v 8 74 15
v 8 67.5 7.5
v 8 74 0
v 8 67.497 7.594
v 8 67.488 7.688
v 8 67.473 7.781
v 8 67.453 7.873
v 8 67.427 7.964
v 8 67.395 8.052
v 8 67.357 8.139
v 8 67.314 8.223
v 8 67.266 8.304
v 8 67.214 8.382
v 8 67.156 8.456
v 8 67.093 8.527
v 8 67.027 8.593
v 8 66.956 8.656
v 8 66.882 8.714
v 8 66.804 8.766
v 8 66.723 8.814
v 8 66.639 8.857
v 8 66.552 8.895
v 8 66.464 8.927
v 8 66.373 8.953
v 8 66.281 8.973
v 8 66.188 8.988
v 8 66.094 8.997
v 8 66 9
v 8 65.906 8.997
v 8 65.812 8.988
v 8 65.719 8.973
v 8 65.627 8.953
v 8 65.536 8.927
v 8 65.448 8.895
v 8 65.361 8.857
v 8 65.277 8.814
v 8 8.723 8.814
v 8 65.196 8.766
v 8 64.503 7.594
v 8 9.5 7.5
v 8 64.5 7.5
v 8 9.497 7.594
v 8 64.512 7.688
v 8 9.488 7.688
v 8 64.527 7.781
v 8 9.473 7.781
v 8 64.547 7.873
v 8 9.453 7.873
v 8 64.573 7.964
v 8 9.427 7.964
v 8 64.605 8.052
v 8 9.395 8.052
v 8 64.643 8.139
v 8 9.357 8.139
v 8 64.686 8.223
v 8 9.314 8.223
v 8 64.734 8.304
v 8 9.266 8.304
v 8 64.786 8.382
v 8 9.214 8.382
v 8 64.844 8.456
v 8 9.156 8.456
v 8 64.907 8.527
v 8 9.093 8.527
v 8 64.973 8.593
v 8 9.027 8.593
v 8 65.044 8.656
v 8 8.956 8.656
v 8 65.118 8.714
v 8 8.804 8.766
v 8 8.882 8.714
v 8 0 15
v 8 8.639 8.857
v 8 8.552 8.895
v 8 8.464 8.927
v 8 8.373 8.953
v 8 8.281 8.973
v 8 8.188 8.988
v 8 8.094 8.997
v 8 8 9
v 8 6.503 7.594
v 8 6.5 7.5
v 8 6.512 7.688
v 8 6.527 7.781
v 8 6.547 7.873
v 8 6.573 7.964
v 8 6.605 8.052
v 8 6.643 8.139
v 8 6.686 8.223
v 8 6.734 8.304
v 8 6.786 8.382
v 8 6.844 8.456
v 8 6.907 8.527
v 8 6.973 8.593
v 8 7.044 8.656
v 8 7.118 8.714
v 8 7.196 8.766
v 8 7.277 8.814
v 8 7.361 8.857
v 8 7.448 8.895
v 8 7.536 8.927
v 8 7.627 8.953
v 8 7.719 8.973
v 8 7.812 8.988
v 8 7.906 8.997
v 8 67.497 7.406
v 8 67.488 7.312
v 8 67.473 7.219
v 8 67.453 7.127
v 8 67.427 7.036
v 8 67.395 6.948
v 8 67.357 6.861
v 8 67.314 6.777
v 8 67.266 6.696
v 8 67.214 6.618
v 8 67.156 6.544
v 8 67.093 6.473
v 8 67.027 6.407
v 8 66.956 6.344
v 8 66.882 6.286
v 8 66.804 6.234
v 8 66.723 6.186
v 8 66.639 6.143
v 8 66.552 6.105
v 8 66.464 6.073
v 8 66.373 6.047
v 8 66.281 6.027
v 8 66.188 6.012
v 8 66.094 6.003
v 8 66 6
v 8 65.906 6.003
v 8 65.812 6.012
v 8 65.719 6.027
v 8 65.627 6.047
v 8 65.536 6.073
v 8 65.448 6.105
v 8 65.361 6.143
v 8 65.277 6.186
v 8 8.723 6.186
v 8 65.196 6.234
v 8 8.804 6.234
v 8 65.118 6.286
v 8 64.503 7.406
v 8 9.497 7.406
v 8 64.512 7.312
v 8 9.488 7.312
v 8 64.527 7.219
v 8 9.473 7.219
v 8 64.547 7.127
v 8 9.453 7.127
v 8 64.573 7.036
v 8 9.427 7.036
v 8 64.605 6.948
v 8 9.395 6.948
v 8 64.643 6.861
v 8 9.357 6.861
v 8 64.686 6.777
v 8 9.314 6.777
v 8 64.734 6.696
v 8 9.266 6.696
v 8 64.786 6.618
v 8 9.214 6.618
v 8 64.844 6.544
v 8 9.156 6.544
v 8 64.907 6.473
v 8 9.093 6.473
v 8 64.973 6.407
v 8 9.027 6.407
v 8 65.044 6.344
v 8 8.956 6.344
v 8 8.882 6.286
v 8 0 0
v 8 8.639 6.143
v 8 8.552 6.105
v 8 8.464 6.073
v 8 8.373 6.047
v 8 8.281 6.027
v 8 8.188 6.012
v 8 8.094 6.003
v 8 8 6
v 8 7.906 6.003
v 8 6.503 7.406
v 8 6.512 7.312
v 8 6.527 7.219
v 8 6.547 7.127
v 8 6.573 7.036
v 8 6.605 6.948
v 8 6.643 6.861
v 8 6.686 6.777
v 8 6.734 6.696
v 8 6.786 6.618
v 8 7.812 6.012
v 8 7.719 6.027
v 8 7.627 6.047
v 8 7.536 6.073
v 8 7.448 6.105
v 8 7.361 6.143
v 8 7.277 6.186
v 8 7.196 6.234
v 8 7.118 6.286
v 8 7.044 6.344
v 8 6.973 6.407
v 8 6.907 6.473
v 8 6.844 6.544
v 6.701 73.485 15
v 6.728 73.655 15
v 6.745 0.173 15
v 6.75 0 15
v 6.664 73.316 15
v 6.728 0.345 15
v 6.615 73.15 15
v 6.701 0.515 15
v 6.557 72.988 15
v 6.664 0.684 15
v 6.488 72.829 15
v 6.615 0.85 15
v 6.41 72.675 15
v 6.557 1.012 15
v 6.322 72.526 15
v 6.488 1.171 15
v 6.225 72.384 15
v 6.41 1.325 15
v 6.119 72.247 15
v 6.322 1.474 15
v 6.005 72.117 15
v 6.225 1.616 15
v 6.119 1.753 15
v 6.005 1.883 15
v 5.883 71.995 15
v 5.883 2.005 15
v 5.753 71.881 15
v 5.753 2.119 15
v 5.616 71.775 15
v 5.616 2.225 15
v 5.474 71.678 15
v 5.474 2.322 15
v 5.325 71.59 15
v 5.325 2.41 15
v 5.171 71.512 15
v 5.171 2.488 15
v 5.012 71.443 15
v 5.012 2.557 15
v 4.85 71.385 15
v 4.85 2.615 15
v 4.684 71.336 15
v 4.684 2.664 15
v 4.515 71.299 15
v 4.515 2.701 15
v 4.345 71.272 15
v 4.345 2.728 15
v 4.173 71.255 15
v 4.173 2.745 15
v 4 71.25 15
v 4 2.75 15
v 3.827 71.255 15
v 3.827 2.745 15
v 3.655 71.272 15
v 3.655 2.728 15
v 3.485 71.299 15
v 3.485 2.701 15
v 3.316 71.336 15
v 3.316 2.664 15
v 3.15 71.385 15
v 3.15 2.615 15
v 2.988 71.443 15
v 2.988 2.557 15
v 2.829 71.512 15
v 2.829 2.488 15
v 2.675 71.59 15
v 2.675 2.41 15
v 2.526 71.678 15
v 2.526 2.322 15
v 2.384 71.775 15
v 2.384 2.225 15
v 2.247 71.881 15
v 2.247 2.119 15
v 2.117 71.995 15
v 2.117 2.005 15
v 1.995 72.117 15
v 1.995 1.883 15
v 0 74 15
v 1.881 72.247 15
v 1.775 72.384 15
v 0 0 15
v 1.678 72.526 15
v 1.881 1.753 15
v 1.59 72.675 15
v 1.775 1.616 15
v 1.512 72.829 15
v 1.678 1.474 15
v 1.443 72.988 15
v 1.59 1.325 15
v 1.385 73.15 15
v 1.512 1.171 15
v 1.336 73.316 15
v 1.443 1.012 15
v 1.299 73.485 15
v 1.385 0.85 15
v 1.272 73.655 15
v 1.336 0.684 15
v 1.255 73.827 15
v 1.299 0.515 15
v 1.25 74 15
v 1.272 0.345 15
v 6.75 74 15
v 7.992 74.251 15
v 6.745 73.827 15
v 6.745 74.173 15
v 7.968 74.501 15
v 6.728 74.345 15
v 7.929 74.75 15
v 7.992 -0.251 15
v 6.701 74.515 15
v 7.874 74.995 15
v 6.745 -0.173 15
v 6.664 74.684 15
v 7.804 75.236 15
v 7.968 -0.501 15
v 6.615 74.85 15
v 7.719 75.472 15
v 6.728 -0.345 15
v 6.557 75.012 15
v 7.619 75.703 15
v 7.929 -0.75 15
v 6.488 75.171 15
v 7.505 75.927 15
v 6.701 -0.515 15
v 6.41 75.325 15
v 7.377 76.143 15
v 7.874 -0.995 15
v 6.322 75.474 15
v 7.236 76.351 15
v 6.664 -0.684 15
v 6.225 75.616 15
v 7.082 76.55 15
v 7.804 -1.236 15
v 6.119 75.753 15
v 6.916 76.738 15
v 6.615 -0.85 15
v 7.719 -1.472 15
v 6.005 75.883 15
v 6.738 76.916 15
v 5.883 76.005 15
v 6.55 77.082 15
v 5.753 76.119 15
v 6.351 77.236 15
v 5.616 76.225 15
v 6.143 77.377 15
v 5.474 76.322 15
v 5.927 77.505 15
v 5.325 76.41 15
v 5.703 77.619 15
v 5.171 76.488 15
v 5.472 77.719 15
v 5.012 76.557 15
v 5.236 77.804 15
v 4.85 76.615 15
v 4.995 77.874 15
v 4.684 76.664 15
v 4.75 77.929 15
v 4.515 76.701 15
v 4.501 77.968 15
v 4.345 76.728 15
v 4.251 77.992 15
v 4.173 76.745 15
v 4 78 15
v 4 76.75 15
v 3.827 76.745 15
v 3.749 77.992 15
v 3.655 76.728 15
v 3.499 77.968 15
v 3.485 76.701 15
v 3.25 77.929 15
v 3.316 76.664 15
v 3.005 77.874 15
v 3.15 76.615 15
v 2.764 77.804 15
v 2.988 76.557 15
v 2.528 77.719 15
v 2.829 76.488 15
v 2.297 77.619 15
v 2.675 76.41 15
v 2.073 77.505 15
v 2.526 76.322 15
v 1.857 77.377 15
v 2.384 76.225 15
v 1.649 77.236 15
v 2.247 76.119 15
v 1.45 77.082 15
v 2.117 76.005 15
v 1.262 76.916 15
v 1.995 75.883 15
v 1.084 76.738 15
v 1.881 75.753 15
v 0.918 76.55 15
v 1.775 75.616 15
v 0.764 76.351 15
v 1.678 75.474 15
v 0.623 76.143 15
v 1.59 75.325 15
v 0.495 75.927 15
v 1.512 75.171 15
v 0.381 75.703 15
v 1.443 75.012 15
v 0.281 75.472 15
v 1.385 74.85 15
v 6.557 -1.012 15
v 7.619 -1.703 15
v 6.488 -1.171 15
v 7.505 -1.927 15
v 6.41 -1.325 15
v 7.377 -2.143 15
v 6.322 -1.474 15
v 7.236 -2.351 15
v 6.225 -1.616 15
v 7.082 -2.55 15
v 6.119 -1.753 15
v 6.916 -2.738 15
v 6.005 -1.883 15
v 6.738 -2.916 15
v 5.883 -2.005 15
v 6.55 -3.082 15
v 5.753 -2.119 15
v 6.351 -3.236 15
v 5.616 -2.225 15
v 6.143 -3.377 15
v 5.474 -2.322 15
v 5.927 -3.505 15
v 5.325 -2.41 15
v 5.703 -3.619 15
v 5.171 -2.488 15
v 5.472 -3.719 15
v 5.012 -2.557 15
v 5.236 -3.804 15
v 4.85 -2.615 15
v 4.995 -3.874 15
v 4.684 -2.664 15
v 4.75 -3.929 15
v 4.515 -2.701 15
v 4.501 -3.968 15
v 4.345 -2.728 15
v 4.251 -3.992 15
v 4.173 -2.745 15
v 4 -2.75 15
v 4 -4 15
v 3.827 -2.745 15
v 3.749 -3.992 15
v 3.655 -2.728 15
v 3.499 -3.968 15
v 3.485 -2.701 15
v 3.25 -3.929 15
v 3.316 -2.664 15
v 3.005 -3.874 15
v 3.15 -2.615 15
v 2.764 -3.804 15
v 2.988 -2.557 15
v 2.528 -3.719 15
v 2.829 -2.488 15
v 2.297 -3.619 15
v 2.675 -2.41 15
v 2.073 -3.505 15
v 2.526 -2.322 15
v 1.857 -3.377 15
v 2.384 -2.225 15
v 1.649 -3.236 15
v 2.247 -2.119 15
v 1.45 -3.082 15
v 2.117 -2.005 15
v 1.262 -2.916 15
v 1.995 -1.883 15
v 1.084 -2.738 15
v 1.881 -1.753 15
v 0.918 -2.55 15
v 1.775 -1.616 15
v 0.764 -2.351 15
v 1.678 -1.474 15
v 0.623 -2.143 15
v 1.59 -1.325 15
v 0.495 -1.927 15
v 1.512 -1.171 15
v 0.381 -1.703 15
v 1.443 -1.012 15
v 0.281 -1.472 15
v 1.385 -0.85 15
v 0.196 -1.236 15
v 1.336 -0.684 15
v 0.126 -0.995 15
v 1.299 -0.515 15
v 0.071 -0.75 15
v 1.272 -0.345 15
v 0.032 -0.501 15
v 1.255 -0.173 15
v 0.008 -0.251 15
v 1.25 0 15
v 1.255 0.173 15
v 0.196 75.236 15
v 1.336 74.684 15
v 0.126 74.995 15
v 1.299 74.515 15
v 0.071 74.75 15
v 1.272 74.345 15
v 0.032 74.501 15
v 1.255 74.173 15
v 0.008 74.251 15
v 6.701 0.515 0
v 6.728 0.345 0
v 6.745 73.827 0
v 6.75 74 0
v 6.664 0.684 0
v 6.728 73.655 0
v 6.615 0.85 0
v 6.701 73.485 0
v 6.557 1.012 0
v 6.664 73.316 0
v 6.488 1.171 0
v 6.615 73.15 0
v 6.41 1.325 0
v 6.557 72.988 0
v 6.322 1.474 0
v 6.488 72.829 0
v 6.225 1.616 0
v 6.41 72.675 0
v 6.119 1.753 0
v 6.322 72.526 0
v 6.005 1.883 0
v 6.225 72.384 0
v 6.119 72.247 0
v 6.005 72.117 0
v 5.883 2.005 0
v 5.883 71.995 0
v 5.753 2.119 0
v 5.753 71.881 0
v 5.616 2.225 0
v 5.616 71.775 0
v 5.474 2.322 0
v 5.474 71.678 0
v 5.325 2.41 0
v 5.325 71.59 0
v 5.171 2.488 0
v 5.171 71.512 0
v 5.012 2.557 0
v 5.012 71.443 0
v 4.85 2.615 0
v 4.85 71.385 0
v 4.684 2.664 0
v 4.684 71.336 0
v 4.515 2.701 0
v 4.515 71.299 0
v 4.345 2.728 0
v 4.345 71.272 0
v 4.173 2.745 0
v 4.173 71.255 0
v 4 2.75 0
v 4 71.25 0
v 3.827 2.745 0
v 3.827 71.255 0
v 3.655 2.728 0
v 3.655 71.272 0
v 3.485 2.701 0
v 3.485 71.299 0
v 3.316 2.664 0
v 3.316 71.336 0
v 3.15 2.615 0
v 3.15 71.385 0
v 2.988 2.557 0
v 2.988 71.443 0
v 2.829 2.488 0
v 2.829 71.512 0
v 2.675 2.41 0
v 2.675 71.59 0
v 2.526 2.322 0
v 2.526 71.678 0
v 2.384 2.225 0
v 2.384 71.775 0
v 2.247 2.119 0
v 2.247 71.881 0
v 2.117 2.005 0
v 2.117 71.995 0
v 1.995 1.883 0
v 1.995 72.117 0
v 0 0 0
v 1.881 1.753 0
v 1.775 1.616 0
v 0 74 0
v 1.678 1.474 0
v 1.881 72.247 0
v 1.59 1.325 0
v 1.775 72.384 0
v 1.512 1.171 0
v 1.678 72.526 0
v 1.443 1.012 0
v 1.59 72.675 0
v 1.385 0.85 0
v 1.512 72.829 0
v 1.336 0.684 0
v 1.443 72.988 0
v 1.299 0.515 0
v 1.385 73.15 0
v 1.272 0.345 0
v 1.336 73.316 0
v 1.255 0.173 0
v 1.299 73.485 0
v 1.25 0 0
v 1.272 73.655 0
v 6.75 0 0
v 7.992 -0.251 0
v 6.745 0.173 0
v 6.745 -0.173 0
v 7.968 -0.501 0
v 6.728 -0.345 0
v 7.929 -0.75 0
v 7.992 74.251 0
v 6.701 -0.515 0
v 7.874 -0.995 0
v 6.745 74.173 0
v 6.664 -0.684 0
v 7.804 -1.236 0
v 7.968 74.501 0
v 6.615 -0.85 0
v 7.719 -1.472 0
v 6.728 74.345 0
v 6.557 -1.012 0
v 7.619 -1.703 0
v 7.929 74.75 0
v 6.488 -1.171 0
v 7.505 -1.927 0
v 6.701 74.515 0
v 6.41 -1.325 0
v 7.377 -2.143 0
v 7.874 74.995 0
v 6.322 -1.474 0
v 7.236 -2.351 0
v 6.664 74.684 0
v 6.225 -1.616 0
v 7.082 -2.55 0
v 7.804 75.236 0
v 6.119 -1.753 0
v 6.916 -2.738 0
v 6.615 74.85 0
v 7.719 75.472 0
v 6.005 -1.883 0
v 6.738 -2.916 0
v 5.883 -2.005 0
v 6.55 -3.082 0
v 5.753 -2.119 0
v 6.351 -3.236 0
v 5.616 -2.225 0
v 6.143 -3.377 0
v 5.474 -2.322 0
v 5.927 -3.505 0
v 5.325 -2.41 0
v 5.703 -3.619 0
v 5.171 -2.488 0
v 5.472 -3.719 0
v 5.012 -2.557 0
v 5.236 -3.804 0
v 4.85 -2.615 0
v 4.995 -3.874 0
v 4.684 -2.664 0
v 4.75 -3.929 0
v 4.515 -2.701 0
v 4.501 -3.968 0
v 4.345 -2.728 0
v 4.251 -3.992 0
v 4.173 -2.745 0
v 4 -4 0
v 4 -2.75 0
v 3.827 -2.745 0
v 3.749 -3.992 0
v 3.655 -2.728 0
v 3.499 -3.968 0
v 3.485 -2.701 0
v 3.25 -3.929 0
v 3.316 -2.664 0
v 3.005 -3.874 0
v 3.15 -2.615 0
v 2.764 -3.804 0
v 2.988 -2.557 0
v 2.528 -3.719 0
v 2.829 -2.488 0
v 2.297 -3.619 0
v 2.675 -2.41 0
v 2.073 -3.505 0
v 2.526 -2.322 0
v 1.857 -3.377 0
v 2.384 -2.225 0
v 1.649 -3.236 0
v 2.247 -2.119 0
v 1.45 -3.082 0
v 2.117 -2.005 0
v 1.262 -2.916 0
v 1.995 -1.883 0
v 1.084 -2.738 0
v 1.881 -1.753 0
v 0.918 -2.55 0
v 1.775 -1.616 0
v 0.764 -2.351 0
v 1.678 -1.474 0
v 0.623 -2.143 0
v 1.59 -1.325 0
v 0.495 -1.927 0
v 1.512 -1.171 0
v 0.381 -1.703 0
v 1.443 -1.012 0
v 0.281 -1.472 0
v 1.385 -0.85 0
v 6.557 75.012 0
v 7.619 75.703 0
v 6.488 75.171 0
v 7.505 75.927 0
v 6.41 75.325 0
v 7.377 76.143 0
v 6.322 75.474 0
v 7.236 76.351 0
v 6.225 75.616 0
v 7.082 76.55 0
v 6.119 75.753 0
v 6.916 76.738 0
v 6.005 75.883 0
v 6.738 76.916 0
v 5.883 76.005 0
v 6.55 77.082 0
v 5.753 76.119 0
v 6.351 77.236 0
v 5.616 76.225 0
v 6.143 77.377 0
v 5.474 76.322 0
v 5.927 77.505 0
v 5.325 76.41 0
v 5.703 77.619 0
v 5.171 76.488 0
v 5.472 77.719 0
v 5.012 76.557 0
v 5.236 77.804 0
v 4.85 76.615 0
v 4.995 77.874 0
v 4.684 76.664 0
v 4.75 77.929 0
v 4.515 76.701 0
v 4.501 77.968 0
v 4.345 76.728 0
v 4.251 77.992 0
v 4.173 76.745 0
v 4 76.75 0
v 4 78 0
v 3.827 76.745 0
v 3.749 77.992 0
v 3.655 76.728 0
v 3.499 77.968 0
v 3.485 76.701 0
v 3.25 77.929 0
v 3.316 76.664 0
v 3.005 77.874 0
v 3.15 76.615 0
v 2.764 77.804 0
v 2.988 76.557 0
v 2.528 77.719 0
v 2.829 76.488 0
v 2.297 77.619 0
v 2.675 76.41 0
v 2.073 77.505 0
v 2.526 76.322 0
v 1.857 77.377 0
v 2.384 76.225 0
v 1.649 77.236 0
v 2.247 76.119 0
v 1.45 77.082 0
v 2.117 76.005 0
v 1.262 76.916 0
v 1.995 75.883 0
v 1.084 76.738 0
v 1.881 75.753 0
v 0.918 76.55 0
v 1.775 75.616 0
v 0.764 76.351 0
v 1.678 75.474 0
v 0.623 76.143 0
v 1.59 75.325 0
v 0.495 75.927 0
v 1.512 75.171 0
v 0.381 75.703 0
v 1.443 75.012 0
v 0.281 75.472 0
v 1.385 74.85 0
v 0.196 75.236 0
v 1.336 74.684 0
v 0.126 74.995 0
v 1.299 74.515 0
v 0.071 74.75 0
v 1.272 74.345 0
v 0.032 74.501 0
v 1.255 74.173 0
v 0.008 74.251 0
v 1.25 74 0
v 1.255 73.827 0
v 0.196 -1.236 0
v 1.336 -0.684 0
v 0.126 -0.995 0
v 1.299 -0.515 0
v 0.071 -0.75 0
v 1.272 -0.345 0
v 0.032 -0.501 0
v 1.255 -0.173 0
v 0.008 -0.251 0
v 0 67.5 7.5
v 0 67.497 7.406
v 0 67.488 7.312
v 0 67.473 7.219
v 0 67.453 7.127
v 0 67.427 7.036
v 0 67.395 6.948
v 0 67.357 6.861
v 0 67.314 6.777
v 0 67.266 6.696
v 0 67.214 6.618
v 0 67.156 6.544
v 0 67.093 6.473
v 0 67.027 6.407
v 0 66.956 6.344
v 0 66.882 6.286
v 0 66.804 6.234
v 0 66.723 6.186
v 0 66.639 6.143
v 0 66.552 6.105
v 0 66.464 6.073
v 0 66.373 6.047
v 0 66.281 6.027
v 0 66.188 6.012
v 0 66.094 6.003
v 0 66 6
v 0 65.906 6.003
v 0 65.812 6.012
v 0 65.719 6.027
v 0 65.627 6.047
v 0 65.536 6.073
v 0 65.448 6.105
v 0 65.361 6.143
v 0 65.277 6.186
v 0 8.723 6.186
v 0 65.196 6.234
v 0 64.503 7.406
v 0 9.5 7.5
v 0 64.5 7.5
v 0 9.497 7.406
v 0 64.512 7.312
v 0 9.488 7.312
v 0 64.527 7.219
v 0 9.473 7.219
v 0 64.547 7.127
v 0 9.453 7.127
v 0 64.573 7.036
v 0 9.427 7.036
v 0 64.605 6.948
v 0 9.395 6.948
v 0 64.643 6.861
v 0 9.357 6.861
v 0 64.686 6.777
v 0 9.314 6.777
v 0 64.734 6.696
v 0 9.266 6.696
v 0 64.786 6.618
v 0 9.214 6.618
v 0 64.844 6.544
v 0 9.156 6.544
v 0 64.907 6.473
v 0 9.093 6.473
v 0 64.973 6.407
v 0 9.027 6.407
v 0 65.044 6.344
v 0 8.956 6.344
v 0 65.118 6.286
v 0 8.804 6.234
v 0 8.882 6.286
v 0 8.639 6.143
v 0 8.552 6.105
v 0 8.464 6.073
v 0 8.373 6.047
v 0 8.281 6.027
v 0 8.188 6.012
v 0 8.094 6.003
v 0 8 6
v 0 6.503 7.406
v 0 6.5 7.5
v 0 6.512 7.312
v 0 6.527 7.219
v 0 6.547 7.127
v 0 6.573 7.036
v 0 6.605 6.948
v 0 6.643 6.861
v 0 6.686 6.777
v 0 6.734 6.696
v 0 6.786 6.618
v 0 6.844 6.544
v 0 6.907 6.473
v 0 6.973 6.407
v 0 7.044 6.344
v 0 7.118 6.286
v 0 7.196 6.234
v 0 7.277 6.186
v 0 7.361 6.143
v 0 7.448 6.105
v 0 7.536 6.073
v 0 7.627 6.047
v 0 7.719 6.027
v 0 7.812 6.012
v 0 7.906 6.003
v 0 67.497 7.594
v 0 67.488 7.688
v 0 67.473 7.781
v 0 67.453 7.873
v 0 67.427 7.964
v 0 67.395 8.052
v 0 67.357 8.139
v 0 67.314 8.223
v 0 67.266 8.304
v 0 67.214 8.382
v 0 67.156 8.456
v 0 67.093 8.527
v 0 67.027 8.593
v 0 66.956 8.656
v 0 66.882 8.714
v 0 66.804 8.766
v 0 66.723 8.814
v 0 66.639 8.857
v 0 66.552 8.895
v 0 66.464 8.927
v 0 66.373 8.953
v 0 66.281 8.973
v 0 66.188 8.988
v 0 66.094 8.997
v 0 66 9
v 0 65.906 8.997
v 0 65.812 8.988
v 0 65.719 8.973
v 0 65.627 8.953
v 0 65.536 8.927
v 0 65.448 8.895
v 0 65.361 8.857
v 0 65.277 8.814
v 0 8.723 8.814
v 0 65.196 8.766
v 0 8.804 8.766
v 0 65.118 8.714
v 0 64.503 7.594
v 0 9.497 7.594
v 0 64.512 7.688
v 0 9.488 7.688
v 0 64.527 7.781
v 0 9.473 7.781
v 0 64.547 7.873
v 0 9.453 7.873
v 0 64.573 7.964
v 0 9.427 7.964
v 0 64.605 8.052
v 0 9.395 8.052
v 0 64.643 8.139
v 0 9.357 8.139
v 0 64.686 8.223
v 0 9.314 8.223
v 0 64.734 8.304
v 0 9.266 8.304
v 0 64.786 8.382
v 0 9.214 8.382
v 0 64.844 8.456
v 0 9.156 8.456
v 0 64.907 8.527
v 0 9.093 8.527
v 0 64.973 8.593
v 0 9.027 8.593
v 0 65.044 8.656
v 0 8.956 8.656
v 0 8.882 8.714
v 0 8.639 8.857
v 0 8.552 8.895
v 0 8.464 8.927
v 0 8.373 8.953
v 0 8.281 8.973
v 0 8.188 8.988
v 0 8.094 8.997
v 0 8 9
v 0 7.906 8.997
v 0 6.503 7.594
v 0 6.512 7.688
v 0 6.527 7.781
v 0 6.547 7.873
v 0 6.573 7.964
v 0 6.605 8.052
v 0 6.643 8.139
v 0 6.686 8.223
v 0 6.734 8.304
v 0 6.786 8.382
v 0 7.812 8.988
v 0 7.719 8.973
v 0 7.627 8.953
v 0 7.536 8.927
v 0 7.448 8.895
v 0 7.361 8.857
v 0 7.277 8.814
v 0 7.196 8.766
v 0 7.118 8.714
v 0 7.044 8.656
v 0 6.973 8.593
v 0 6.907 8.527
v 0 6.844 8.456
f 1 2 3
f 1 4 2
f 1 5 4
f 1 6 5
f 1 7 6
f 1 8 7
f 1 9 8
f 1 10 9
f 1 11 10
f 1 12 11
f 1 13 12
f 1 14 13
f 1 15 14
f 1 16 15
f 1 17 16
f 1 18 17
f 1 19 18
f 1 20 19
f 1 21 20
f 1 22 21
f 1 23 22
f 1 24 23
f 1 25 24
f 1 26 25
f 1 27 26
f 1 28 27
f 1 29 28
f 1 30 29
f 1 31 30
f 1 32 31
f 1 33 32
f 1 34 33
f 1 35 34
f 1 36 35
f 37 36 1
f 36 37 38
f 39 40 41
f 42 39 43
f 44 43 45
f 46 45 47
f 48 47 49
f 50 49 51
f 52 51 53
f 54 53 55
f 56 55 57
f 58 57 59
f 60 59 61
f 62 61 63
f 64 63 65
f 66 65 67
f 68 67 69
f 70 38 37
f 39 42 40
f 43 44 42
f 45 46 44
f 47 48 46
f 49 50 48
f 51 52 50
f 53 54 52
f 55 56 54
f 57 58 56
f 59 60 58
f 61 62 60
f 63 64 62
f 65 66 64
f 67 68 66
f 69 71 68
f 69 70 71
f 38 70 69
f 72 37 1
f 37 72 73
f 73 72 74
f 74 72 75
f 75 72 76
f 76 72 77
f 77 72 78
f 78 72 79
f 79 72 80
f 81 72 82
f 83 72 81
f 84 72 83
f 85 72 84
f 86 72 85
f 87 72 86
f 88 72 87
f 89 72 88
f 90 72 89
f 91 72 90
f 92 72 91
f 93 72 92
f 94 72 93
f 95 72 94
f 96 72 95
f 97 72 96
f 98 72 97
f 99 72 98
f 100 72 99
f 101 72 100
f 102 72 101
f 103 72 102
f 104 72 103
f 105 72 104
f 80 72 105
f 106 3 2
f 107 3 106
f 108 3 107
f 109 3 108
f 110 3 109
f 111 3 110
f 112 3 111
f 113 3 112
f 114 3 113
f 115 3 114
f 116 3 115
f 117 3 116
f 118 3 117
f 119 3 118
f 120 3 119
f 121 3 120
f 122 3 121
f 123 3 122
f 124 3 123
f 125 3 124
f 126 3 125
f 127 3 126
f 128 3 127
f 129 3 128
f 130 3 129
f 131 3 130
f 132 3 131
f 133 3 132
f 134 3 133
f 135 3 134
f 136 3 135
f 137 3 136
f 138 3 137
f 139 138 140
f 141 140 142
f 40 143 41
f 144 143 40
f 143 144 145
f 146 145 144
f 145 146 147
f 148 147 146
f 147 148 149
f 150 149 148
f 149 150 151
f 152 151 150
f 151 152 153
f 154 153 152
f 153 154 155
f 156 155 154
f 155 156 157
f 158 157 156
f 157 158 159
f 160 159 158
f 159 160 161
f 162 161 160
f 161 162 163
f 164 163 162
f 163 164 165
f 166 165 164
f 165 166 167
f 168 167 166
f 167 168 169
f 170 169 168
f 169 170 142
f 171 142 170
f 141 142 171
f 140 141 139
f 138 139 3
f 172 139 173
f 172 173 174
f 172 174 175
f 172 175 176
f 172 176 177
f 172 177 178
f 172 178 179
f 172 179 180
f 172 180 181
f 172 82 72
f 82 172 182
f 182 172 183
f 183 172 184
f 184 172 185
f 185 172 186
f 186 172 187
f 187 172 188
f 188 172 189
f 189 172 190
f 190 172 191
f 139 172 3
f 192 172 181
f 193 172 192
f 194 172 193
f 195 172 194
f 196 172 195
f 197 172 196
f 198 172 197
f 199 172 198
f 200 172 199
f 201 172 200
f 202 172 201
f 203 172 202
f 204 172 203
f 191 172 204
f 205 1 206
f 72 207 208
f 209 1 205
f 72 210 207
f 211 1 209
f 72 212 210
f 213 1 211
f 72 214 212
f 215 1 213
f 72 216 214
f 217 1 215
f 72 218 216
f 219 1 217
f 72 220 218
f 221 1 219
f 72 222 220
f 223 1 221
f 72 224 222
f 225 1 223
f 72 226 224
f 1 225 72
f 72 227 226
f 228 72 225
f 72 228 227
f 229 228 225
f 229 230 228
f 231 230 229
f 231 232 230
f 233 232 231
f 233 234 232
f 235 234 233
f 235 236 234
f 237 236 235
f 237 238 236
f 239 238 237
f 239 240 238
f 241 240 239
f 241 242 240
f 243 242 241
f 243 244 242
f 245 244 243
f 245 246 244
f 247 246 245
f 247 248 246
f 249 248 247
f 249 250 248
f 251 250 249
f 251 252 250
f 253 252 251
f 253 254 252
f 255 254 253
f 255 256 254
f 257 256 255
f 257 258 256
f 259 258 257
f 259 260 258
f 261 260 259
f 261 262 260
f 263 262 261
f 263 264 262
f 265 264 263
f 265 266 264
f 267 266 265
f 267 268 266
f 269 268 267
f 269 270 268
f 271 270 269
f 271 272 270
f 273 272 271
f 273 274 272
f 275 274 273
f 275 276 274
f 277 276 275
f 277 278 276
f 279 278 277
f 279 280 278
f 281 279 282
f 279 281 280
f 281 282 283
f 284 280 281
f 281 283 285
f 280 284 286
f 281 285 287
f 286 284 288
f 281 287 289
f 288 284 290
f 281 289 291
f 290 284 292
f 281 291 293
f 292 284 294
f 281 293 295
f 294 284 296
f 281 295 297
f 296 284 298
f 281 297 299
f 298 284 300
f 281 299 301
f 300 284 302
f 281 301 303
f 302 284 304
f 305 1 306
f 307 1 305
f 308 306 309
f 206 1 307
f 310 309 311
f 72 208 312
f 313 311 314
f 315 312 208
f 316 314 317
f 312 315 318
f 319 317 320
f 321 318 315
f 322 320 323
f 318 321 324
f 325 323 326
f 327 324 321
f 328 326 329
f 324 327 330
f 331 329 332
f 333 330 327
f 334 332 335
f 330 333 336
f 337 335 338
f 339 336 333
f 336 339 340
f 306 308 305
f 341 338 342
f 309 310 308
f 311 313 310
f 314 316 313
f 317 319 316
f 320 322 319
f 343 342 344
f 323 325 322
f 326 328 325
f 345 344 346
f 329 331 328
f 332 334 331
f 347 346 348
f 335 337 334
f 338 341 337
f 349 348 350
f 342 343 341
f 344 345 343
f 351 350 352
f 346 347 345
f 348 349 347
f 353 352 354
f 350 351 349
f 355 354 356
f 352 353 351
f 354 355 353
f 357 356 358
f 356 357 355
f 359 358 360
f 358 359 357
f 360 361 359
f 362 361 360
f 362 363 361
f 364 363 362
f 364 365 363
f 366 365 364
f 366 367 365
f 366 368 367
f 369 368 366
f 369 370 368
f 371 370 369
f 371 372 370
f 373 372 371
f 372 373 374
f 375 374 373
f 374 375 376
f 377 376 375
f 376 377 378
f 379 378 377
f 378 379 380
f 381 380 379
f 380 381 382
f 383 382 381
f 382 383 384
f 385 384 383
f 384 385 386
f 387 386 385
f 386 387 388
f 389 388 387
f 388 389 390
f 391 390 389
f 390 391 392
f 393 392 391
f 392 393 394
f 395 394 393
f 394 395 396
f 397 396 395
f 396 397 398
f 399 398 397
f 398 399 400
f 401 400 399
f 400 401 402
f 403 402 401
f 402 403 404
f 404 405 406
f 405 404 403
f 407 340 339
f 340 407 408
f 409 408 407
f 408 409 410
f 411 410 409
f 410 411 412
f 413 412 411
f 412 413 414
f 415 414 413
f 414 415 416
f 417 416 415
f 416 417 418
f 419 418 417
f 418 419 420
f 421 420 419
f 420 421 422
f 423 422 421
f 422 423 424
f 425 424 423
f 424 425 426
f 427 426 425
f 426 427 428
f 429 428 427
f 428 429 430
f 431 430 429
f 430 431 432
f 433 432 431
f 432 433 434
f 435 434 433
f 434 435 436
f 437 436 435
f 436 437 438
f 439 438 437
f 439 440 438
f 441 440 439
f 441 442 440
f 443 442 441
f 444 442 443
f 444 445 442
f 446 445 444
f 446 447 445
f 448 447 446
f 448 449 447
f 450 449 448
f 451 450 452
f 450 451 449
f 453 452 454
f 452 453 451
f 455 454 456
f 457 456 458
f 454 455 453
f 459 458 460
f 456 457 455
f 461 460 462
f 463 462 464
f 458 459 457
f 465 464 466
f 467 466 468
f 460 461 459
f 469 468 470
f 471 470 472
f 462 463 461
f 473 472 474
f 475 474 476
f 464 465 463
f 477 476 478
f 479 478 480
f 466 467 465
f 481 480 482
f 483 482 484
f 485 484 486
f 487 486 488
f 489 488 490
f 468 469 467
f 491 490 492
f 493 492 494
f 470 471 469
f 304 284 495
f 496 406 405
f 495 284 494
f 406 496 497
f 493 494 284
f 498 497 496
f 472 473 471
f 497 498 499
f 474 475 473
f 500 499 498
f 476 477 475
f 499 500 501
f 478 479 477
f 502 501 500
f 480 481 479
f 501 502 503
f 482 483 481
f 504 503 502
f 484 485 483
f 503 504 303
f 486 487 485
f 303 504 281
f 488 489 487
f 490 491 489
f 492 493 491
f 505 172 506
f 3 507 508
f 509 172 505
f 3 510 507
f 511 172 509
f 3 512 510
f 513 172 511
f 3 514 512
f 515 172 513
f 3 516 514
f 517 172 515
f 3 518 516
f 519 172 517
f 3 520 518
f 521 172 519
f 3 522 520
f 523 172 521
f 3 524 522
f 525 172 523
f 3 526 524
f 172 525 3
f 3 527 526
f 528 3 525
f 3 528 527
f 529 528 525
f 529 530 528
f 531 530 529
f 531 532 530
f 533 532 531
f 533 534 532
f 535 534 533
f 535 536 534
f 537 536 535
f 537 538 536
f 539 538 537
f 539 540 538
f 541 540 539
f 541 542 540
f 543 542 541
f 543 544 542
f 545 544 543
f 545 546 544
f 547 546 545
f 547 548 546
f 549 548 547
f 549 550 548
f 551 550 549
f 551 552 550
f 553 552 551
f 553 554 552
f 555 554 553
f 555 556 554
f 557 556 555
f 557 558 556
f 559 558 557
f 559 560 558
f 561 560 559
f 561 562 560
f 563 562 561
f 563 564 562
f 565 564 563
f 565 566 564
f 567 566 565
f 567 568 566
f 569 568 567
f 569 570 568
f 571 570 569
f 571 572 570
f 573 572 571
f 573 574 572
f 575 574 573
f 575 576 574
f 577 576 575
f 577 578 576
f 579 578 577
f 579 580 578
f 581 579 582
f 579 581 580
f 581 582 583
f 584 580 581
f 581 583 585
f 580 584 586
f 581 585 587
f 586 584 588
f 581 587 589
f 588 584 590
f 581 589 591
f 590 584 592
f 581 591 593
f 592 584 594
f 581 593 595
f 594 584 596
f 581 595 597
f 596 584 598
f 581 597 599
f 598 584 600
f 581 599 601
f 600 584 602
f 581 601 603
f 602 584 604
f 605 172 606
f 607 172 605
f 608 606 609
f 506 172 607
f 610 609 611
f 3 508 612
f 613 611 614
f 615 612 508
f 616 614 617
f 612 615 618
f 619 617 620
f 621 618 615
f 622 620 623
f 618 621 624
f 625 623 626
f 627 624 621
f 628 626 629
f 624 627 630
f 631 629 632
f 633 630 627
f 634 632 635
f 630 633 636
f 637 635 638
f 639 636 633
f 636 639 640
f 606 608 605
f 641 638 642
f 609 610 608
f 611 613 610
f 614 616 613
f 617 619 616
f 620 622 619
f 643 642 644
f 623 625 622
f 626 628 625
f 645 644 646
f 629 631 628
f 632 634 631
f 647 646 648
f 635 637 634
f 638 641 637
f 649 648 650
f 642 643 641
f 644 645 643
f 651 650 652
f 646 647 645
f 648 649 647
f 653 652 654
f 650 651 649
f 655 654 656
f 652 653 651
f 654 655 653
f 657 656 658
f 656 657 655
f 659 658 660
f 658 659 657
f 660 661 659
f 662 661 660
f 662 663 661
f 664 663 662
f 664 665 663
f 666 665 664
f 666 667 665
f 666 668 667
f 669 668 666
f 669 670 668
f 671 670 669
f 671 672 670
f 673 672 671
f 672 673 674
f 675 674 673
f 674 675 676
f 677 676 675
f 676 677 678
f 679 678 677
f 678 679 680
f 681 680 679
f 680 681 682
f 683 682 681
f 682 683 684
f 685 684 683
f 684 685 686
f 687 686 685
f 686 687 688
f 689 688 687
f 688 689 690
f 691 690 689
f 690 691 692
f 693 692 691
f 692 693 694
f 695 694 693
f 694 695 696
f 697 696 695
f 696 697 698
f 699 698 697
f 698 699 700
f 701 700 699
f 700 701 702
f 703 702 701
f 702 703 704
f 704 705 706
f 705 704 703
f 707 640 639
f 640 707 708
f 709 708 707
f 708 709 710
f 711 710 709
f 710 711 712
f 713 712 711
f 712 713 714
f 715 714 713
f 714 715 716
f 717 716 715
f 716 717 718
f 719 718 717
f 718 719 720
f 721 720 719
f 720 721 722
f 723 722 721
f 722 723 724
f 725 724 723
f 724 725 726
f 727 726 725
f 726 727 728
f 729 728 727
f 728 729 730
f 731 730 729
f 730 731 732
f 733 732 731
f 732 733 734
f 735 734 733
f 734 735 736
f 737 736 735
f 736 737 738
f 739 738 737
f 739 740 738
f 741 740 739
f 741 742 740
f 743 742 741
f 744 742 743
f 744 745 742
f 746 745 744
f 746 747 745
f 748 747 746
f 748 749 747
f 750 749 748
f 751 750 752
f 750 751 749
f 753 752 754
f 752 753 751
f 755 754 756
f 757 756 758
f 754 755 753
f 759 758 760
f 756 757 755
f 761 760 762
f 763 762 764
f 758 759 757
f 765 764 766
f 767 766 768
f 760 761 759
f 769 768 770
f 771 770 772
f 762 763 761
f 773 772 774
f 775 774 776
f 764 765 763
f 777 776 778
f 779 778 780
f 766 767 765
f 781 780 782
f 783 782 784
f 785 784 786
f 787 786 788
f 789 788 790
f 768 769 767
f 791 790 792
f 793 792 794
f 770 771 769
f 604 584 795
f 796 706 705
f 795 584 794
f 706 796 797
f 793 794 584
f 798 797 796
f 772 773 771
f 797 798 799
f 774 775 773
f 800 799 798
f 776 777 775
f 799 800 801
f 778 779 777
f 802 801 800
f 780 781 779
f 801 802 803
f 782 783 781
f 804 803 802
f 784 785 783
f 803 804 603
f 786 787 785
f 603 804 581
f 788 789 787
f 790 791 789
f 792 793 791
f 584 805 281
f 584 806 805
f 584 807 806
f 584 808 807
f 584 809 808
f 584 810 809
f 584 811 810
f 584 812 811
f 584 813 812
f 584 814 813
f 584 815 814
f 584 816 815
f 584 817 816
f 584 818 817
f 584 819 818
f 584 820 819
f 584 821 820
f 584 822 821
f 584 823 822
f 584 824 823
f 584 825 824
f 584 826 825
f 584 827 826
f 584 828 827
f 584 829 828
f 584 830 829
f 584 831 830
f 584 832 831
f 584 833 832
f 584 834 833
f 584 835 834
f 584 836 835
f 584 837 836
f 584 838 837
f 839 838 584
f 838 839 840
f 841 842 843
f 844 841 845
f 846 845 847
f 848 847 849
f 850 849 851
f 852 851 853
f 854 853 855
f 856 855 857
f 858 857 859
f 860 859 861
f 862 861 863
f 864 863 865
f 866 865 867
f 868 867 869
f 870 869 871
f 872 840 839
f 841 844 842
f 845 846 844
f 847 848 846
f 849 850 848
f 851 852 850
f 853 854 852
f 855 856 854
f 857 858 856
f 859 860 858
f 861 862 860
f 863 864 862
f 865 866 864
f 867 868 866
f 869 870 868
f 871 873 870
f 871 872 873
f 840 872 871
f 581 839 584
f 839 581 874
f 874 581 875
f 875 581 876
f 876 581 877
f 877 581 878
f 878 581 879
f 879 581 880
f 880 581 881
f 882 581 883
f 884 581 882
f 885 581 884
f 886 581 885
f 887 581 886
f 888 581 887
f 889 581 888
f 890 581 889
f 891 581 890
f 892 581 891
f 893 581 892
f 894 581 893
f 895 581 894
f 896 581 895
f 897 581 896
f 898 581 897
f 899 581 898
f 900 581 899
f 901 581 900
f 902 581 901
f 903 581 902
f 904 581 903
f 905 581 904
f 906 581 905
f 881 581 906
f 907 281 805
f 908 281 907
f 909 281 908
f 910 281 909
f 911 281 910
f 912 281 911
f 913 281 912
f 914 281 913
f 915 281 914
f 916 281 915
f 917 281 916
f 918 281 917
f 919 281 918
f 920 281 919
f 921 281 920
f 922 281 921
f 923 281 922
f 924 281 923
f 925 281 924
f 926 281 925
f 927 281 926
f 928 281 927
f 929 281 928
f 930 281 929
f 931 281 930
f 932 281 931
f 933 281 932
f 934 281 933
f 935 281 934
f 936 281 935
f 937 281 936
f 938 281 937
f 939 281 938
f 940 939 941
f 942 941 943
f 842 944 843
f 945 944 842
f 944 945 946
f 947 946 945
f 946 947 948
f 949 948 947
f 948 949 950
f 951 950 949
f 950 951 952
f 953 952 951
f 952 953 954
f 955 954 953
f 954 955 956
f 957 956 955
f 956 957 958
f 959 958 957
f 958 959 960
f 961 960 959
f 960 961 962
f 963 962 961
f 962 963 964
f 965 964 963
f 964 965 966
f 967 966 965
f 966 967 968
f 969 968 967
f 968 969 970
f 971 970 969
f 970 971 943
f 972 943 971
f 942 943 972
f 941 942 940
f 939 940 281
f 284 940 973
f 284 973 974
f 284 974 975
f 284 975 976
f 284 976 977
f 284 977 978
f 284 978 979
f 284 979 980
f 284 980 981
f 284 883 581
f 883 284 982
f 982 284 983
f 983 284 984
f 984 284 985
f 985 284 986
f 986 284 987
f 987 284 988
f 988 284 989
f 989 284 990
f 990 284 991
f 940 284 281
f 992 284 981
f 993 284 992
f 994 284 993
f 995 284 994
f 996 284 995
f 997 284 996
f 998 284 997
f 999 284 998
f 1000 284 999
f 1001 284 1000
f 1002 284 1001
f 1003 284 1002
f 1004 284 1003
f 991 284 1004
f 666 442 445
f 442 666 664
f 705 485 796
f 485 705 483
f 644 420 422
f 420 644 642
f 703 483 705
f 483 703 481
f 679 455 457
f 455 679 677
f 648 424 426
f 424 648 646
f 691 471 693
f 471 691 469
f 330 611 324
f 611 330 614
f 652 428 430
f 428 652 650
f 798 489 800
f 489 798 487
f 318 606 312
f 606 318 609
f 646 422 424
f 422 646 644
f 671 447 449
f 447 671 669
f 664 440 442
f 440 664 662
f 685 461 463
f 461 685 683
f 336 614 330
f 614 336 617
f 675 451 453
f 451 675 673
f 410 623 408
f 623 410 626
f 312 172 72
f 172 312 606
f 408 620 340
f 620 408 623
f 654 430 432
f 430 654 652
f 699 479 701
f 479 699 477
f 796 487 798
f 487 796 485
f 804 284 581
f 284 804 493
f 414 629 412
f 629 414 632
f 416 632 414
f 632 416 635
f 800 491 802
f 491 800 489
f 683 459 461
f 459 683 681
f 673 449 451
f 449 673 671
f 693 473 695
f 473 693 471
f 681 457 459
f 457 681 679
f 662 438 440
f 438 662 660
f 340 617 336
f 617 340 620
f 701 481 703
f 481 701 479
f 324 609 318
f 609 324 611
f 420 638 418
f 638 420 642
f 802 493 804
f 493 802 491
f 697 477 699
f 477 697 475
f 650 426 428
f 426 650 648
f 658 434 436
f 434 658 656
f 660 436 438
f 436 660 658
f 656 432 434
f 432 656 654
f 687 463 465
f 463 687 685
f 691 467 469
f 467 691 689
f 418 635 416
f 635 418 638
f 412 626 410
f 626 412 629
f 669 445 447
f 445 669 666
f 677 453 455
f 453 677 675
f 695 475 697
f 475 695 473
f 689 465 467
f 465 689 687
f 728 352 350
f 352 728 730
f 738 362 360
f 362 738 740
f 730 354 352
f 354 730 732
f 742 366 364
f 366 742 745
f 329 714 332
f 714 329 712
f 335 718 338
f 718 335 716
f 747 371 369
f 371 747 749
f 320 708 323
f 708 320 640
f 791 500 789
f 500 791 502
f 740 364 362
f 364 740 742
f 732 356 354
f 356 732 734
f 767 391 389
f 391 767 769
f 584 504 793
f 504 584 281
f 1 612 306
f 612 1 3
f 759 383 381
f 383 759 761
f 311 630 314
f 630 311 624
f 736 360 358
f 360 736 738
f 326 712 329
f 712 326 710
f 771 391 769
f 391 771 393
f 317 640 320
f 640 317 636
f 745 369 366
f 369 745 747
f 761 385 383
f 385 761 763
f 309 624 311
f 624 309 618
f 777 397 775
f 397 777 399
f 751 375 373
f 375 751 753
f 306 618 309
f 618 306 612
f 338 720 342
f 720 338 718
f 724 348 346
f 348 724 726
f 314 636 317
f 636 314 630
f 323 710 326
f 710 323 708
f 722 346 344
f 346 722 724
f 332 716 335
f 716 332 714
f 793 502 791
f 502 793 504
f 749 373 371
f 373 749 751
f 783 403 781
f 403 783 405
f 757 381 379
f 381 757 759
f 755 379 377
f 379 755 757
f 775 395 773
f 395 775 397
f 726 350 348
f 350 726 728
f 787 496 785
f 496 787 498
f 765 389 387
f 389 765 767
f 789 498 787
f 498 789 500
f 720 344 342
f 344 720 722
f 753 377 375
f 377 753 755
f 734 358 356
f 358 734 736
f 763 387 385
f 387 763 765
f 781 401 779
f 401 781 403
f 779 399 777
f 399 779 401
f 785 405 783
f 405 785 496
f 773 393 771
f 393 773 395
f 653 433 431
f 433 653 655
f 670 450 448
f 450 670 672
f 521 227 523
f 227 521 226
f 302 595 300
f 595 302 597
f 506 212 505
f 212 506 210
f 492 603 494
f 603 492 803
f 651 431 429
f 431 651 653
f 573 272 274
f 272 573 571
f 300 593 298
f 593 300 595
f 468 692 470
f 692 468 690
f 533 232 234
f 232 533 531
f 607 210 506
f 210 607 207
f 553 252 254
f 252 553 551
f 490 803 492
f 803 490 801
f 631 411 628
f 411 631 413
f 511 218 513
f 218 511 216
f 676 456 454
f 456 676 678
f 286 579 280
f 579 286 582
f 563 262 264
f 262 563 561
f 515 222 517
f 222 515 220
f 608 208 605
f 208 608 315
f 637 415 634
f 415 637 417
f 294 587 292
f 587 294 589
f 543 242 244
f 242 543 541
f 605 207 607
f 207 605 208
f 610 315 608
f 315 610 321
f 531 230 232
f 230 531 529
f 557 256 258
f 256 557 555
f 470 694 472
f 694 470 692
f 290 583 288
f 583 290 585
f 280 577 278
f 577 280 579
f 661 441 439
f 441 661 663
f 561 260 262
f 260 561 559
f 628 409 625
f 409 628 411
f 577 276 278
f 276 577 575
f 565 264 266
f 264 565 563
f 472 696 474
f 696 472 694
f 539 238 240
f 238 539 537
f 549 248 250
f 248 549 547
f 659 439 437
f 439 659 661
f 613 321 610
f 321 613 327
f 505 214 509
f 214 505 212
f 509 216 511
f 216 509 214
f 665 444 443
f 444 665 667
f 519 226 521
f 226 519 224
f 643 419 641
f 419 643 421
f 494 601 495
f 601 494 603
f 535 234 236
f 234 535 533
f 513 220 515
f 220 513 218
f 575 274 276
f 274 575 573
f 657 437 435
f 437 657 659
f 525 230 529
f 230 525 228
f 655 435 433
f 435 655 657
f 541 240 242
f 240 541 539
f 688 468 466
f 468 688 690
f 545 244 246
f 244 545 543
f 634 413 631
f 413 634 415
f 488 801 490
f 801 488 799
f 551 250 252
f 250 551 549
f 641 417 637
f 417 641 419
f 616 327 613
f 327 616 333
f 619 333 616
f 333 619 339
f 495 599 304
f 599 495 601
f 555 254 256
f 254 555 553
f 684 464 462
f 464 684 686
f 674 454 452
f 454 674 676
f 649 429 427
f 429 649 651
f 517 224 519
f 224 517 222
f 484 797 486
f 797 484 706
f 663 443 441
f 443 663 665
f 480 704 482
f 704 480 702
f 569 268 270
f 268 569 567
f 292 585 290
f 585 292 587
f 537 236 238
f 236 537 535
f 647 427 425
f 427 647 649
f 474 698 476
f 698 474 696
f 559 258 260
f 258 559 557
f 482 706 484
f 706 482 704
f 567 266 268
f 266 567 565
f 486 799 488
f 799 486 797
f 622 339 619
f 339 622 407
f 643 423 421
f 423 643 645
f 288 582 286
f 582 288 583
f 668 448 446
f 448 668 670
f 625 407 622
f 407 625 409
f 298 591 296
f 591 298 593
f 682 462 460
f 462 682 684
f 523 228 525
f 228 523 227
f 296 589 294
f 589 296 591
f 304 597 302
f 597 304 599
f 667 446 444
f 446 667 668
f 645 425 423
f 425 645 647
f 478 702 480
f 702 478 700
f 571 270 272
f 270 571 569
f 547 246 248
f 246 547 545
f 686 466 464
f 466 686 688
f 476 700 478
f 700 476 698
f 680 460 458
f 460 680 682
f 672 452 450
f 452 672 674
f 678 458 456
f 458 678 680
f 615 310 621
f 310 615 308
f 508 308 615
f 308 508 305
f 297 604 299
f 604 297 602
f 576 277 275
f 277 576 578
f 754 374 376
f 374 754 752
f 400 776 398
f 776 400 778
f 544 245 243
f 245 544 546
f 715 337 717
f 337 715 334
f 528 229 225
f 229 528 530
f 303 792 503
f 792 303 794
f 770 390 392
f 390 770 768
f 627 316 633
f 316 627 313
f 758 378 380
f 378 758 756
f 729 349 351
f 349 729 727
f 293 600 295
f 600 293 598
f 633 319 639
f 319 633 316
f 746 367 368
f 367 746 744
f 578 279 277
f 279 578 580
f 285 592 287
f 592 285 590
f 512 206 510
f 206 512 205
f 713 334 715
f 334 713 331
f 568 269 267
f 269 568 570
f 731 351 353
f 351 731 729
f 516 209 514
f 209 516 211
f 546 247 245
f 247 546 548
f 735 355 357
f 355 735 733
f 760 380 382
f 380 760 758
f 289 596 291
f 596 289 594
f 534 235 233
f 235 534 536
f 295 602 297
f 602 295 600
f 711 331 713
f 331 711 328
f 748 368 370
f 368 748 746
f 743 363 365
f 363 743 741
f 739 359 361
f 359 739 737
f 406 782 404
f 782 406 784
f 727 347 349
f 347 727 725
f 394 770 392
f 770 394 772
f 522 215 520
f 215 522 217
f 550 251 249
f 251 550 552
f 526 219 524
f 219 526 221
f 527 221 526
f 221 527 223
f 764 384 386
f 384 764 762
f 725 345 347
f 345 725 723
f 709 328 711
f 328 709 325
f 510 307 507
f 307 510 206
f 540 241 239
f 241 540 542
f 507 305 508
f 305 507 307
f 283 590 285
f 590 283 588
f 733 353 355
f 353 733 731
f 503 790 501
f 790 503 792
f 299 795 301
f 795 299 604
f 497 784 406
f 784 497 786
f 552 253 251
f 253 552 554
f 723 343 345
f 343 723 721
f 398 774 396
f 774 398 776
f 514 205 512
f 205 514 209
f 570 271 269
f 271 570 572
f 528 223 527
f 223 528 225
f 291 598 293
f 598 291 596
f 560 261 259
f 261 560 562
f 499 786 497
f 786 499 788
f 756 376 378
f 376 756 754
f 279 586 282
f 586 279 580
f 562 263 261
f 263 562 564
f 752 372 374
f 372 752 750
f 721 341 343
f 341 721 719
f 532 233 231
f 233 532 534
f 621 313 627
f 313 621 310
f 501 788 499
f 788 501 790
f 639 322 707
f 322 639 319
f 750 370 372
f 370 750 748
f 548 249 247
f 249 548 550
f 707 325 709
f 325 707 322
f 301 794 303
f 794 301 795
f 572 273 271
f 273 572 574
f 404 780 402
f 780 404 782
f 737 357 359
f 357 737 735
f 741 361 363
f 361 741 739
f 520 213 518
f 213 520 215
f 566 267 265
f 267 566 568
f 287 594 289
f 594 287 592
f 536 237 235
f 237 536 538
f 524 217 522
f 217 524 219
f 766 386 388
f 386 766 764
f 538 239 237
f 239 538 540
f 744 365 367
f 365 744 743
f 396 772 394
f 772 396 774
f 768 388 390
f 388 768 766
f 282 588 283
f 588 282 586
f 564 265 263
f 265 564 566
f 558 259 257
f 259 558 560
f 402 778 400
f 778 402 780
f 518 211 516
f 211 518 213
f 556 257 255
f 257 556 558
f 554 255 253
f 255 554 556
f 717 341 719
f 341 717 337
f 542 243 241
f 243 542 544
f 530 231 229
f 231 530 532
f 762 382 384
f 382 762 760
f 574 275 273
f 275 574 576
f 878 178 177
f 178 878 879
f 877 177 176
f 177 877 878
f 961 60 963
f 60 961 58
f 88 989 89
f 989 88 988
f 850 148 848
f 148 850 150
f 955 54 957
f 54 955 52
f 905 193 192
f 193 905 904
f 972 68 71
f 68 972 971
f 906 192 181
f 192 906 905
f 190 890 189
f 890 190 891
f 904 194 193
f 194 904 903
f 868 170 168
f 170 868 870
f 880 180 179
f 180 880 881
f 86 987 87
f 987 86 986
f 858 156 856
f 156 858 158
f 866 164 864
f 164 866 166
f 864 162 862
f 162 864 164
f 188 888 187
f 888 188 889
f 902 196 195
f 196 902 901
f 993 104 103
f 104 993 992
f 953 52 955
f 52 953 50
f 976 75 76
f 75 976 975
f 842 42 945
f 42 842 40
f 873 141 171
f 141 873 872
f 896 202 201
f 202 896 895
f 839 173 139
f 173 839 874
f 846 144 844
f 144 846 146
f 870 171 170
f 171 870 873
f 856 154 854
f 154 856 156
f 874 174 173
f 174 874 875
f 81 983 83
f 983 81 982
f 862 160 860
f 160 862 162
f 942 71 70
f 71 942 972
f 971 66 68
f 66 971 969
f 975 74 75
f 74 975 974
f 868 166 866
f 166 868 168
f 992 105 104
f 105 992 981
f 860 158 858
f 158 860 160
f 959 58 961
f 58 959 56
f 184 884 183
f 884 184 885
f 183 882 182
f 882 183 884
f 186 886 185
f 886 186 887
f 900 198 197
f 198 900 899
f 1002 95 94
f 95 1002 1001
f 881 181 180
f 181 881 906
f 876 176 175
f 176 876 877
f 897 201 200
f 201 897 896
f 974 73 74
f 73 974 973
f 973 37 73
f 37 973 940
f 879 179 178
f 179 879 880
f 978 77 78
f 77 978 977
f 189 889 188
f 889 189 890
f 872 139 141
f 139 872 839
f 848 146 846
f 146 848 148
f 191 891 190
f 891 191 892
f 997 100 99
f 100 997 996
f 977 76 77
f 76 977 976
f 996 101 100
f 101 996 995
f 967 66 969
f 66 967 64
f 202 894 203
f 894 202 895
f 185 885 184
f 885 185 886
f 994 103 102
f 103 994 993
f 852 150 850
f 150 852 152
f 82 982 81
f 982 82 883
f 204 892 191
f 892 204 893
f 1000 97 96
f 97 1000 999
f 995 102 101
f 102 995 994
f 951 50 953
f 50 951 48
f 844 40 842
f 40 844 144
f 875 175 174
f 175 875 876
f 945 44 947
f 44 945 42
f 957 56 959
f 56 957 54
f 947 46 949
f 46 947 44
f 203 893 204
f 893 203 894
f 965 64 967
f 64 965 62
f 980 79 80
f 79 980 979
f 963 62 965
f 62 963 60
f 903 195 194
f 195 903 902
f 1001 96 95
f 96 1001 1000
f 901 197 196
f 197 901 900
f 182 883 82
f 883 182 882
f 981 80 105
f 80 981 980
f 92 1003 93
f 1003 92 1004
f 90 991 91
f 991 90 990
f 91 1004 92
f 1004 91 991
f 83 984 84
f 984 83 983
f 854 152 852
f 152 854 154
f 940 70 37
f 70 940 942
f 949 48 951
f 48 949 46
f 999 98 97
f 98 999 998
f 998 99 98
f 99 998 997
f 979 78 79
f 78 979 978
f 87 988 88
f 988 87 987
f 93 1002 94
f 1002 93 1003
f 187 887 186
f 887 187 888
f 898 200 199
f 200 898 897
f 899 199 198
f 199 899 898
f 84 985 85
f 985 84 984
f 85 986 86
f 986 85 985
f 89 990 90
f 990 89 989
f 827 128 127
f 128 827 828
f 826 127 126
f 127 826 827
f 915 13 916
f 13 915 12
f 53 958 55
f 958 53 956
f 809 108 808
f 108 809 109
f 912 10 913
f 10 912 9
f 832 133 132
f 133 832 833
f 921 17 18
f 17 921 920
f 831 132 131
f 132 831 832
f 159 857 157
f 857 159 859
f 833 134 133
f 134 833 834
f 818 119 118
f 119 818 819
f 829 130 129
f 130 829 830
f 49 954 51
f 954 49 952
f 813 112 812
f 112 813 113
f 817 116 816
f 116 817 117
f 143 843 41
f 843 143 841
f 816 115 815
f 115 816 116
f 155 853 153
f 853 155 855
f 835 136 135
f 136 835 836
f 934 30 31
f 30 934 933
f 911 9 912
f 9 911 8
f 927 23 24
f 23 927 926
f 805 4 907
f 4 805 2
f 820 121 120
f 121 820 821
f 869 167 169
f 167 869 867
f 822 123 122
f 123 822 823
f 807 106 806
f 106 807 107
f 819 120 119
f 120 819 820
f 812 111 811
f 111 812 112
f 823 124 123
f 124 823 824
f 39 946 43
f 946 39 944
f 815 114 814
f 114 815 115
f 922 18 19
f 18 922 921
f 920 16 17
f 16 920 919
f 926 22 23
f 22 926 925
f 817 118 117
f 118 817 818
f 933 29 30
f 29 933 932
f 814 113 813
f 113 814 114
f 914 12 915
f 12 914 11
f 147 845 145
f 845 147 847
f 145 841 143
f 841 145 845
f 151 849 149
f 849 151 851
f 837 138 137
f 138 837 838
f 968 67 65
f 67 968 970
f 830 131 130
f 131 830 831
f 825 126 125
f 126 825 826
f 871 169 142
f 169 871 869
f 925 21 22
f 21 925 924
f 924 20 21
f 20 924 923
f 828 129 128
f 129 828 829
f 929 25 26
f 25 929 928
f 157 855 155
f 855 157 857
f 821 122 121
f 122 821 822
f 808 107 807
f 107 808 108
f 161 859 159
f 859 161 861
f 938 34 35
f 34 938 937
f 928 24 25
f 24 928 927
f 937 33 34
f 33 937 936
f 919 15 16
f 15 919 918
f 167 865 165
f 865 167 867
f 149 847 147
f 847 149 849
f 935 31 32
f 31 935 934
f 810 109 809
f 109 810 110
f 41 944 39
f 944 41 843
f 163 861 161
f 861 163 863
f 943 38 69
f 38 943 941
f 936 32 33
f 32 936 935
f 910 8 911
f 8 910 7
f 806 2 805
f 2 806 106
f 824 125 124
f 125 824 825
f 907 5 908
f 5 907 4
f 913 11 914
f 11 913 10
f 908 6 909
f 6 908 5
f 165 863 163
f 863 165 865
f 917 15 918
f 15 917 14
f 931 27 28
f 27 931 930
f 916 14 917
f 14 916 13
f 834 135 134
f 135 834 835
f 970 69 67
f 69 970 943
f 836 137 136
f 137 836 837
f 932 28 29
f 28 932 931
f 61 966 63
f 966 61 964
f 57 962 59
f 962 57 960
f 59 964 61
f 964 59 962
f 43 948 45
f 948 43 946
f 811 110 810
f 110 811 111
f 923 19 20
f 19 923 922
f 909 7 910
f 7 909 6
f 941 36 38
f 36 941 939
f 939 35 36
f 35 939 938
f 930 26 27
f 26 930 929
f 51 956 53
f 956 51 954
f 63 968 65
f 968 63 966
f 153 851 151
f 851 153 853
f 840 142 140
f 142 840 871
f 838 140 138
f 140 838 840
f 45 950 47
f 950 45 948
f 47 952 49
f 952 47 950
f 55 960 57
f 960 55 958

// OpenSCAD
/*

Description: those spacers are used to assemble my rocket payload altimeters plate. You will need a minimum of 2 of those
Author: Boris du Reau
Date: 24/08/2018
Lenght between rod holes: 74mm
*/
$fn=100; 
// diameter of the holes used to screw the altimeter plate
plate_hole_diam= 3;
spacer_width = 15;
spacer_rod_diam = 5.5;
//lenght between the rod hols
spacer_length= 74;
spacer_height=8;

// main spacer
module spacer() {
cube ([spacer_height,spacer_length,spacer_width ]);
translate ([spacer_height/2, 0,0]) cylinder (h=spacer_width, r=spacer_height/2);
translate ([spacer_height/2, spacer_length,0]) cylinder (h=spacer_width, r=spacer_height/2);
}

difference () {
    spacer();
    // rod holes
    translate ([spacer_height/2, 0,0])cylinder(h=spacer_width, r=spacer_rod_diam/2);
    translate ([spacer_height/2, spacer_length,0])cylinder(h=spacer_width, r=spacer_rod_diam/2);
    //holes to screw the altimeters plate
    rotate ([0,90,0]) translate ([-spacer_width/2,spacer_height,0])cylinder(h=spacer_width, r=plate_hole_diam/2);
    rotate ([0,90,0]) translate ([-spacer_width/2,spacer_length-spacer_height,0])cylinder(h=spacer_width, r=plate_hole_diam/2);  
}
